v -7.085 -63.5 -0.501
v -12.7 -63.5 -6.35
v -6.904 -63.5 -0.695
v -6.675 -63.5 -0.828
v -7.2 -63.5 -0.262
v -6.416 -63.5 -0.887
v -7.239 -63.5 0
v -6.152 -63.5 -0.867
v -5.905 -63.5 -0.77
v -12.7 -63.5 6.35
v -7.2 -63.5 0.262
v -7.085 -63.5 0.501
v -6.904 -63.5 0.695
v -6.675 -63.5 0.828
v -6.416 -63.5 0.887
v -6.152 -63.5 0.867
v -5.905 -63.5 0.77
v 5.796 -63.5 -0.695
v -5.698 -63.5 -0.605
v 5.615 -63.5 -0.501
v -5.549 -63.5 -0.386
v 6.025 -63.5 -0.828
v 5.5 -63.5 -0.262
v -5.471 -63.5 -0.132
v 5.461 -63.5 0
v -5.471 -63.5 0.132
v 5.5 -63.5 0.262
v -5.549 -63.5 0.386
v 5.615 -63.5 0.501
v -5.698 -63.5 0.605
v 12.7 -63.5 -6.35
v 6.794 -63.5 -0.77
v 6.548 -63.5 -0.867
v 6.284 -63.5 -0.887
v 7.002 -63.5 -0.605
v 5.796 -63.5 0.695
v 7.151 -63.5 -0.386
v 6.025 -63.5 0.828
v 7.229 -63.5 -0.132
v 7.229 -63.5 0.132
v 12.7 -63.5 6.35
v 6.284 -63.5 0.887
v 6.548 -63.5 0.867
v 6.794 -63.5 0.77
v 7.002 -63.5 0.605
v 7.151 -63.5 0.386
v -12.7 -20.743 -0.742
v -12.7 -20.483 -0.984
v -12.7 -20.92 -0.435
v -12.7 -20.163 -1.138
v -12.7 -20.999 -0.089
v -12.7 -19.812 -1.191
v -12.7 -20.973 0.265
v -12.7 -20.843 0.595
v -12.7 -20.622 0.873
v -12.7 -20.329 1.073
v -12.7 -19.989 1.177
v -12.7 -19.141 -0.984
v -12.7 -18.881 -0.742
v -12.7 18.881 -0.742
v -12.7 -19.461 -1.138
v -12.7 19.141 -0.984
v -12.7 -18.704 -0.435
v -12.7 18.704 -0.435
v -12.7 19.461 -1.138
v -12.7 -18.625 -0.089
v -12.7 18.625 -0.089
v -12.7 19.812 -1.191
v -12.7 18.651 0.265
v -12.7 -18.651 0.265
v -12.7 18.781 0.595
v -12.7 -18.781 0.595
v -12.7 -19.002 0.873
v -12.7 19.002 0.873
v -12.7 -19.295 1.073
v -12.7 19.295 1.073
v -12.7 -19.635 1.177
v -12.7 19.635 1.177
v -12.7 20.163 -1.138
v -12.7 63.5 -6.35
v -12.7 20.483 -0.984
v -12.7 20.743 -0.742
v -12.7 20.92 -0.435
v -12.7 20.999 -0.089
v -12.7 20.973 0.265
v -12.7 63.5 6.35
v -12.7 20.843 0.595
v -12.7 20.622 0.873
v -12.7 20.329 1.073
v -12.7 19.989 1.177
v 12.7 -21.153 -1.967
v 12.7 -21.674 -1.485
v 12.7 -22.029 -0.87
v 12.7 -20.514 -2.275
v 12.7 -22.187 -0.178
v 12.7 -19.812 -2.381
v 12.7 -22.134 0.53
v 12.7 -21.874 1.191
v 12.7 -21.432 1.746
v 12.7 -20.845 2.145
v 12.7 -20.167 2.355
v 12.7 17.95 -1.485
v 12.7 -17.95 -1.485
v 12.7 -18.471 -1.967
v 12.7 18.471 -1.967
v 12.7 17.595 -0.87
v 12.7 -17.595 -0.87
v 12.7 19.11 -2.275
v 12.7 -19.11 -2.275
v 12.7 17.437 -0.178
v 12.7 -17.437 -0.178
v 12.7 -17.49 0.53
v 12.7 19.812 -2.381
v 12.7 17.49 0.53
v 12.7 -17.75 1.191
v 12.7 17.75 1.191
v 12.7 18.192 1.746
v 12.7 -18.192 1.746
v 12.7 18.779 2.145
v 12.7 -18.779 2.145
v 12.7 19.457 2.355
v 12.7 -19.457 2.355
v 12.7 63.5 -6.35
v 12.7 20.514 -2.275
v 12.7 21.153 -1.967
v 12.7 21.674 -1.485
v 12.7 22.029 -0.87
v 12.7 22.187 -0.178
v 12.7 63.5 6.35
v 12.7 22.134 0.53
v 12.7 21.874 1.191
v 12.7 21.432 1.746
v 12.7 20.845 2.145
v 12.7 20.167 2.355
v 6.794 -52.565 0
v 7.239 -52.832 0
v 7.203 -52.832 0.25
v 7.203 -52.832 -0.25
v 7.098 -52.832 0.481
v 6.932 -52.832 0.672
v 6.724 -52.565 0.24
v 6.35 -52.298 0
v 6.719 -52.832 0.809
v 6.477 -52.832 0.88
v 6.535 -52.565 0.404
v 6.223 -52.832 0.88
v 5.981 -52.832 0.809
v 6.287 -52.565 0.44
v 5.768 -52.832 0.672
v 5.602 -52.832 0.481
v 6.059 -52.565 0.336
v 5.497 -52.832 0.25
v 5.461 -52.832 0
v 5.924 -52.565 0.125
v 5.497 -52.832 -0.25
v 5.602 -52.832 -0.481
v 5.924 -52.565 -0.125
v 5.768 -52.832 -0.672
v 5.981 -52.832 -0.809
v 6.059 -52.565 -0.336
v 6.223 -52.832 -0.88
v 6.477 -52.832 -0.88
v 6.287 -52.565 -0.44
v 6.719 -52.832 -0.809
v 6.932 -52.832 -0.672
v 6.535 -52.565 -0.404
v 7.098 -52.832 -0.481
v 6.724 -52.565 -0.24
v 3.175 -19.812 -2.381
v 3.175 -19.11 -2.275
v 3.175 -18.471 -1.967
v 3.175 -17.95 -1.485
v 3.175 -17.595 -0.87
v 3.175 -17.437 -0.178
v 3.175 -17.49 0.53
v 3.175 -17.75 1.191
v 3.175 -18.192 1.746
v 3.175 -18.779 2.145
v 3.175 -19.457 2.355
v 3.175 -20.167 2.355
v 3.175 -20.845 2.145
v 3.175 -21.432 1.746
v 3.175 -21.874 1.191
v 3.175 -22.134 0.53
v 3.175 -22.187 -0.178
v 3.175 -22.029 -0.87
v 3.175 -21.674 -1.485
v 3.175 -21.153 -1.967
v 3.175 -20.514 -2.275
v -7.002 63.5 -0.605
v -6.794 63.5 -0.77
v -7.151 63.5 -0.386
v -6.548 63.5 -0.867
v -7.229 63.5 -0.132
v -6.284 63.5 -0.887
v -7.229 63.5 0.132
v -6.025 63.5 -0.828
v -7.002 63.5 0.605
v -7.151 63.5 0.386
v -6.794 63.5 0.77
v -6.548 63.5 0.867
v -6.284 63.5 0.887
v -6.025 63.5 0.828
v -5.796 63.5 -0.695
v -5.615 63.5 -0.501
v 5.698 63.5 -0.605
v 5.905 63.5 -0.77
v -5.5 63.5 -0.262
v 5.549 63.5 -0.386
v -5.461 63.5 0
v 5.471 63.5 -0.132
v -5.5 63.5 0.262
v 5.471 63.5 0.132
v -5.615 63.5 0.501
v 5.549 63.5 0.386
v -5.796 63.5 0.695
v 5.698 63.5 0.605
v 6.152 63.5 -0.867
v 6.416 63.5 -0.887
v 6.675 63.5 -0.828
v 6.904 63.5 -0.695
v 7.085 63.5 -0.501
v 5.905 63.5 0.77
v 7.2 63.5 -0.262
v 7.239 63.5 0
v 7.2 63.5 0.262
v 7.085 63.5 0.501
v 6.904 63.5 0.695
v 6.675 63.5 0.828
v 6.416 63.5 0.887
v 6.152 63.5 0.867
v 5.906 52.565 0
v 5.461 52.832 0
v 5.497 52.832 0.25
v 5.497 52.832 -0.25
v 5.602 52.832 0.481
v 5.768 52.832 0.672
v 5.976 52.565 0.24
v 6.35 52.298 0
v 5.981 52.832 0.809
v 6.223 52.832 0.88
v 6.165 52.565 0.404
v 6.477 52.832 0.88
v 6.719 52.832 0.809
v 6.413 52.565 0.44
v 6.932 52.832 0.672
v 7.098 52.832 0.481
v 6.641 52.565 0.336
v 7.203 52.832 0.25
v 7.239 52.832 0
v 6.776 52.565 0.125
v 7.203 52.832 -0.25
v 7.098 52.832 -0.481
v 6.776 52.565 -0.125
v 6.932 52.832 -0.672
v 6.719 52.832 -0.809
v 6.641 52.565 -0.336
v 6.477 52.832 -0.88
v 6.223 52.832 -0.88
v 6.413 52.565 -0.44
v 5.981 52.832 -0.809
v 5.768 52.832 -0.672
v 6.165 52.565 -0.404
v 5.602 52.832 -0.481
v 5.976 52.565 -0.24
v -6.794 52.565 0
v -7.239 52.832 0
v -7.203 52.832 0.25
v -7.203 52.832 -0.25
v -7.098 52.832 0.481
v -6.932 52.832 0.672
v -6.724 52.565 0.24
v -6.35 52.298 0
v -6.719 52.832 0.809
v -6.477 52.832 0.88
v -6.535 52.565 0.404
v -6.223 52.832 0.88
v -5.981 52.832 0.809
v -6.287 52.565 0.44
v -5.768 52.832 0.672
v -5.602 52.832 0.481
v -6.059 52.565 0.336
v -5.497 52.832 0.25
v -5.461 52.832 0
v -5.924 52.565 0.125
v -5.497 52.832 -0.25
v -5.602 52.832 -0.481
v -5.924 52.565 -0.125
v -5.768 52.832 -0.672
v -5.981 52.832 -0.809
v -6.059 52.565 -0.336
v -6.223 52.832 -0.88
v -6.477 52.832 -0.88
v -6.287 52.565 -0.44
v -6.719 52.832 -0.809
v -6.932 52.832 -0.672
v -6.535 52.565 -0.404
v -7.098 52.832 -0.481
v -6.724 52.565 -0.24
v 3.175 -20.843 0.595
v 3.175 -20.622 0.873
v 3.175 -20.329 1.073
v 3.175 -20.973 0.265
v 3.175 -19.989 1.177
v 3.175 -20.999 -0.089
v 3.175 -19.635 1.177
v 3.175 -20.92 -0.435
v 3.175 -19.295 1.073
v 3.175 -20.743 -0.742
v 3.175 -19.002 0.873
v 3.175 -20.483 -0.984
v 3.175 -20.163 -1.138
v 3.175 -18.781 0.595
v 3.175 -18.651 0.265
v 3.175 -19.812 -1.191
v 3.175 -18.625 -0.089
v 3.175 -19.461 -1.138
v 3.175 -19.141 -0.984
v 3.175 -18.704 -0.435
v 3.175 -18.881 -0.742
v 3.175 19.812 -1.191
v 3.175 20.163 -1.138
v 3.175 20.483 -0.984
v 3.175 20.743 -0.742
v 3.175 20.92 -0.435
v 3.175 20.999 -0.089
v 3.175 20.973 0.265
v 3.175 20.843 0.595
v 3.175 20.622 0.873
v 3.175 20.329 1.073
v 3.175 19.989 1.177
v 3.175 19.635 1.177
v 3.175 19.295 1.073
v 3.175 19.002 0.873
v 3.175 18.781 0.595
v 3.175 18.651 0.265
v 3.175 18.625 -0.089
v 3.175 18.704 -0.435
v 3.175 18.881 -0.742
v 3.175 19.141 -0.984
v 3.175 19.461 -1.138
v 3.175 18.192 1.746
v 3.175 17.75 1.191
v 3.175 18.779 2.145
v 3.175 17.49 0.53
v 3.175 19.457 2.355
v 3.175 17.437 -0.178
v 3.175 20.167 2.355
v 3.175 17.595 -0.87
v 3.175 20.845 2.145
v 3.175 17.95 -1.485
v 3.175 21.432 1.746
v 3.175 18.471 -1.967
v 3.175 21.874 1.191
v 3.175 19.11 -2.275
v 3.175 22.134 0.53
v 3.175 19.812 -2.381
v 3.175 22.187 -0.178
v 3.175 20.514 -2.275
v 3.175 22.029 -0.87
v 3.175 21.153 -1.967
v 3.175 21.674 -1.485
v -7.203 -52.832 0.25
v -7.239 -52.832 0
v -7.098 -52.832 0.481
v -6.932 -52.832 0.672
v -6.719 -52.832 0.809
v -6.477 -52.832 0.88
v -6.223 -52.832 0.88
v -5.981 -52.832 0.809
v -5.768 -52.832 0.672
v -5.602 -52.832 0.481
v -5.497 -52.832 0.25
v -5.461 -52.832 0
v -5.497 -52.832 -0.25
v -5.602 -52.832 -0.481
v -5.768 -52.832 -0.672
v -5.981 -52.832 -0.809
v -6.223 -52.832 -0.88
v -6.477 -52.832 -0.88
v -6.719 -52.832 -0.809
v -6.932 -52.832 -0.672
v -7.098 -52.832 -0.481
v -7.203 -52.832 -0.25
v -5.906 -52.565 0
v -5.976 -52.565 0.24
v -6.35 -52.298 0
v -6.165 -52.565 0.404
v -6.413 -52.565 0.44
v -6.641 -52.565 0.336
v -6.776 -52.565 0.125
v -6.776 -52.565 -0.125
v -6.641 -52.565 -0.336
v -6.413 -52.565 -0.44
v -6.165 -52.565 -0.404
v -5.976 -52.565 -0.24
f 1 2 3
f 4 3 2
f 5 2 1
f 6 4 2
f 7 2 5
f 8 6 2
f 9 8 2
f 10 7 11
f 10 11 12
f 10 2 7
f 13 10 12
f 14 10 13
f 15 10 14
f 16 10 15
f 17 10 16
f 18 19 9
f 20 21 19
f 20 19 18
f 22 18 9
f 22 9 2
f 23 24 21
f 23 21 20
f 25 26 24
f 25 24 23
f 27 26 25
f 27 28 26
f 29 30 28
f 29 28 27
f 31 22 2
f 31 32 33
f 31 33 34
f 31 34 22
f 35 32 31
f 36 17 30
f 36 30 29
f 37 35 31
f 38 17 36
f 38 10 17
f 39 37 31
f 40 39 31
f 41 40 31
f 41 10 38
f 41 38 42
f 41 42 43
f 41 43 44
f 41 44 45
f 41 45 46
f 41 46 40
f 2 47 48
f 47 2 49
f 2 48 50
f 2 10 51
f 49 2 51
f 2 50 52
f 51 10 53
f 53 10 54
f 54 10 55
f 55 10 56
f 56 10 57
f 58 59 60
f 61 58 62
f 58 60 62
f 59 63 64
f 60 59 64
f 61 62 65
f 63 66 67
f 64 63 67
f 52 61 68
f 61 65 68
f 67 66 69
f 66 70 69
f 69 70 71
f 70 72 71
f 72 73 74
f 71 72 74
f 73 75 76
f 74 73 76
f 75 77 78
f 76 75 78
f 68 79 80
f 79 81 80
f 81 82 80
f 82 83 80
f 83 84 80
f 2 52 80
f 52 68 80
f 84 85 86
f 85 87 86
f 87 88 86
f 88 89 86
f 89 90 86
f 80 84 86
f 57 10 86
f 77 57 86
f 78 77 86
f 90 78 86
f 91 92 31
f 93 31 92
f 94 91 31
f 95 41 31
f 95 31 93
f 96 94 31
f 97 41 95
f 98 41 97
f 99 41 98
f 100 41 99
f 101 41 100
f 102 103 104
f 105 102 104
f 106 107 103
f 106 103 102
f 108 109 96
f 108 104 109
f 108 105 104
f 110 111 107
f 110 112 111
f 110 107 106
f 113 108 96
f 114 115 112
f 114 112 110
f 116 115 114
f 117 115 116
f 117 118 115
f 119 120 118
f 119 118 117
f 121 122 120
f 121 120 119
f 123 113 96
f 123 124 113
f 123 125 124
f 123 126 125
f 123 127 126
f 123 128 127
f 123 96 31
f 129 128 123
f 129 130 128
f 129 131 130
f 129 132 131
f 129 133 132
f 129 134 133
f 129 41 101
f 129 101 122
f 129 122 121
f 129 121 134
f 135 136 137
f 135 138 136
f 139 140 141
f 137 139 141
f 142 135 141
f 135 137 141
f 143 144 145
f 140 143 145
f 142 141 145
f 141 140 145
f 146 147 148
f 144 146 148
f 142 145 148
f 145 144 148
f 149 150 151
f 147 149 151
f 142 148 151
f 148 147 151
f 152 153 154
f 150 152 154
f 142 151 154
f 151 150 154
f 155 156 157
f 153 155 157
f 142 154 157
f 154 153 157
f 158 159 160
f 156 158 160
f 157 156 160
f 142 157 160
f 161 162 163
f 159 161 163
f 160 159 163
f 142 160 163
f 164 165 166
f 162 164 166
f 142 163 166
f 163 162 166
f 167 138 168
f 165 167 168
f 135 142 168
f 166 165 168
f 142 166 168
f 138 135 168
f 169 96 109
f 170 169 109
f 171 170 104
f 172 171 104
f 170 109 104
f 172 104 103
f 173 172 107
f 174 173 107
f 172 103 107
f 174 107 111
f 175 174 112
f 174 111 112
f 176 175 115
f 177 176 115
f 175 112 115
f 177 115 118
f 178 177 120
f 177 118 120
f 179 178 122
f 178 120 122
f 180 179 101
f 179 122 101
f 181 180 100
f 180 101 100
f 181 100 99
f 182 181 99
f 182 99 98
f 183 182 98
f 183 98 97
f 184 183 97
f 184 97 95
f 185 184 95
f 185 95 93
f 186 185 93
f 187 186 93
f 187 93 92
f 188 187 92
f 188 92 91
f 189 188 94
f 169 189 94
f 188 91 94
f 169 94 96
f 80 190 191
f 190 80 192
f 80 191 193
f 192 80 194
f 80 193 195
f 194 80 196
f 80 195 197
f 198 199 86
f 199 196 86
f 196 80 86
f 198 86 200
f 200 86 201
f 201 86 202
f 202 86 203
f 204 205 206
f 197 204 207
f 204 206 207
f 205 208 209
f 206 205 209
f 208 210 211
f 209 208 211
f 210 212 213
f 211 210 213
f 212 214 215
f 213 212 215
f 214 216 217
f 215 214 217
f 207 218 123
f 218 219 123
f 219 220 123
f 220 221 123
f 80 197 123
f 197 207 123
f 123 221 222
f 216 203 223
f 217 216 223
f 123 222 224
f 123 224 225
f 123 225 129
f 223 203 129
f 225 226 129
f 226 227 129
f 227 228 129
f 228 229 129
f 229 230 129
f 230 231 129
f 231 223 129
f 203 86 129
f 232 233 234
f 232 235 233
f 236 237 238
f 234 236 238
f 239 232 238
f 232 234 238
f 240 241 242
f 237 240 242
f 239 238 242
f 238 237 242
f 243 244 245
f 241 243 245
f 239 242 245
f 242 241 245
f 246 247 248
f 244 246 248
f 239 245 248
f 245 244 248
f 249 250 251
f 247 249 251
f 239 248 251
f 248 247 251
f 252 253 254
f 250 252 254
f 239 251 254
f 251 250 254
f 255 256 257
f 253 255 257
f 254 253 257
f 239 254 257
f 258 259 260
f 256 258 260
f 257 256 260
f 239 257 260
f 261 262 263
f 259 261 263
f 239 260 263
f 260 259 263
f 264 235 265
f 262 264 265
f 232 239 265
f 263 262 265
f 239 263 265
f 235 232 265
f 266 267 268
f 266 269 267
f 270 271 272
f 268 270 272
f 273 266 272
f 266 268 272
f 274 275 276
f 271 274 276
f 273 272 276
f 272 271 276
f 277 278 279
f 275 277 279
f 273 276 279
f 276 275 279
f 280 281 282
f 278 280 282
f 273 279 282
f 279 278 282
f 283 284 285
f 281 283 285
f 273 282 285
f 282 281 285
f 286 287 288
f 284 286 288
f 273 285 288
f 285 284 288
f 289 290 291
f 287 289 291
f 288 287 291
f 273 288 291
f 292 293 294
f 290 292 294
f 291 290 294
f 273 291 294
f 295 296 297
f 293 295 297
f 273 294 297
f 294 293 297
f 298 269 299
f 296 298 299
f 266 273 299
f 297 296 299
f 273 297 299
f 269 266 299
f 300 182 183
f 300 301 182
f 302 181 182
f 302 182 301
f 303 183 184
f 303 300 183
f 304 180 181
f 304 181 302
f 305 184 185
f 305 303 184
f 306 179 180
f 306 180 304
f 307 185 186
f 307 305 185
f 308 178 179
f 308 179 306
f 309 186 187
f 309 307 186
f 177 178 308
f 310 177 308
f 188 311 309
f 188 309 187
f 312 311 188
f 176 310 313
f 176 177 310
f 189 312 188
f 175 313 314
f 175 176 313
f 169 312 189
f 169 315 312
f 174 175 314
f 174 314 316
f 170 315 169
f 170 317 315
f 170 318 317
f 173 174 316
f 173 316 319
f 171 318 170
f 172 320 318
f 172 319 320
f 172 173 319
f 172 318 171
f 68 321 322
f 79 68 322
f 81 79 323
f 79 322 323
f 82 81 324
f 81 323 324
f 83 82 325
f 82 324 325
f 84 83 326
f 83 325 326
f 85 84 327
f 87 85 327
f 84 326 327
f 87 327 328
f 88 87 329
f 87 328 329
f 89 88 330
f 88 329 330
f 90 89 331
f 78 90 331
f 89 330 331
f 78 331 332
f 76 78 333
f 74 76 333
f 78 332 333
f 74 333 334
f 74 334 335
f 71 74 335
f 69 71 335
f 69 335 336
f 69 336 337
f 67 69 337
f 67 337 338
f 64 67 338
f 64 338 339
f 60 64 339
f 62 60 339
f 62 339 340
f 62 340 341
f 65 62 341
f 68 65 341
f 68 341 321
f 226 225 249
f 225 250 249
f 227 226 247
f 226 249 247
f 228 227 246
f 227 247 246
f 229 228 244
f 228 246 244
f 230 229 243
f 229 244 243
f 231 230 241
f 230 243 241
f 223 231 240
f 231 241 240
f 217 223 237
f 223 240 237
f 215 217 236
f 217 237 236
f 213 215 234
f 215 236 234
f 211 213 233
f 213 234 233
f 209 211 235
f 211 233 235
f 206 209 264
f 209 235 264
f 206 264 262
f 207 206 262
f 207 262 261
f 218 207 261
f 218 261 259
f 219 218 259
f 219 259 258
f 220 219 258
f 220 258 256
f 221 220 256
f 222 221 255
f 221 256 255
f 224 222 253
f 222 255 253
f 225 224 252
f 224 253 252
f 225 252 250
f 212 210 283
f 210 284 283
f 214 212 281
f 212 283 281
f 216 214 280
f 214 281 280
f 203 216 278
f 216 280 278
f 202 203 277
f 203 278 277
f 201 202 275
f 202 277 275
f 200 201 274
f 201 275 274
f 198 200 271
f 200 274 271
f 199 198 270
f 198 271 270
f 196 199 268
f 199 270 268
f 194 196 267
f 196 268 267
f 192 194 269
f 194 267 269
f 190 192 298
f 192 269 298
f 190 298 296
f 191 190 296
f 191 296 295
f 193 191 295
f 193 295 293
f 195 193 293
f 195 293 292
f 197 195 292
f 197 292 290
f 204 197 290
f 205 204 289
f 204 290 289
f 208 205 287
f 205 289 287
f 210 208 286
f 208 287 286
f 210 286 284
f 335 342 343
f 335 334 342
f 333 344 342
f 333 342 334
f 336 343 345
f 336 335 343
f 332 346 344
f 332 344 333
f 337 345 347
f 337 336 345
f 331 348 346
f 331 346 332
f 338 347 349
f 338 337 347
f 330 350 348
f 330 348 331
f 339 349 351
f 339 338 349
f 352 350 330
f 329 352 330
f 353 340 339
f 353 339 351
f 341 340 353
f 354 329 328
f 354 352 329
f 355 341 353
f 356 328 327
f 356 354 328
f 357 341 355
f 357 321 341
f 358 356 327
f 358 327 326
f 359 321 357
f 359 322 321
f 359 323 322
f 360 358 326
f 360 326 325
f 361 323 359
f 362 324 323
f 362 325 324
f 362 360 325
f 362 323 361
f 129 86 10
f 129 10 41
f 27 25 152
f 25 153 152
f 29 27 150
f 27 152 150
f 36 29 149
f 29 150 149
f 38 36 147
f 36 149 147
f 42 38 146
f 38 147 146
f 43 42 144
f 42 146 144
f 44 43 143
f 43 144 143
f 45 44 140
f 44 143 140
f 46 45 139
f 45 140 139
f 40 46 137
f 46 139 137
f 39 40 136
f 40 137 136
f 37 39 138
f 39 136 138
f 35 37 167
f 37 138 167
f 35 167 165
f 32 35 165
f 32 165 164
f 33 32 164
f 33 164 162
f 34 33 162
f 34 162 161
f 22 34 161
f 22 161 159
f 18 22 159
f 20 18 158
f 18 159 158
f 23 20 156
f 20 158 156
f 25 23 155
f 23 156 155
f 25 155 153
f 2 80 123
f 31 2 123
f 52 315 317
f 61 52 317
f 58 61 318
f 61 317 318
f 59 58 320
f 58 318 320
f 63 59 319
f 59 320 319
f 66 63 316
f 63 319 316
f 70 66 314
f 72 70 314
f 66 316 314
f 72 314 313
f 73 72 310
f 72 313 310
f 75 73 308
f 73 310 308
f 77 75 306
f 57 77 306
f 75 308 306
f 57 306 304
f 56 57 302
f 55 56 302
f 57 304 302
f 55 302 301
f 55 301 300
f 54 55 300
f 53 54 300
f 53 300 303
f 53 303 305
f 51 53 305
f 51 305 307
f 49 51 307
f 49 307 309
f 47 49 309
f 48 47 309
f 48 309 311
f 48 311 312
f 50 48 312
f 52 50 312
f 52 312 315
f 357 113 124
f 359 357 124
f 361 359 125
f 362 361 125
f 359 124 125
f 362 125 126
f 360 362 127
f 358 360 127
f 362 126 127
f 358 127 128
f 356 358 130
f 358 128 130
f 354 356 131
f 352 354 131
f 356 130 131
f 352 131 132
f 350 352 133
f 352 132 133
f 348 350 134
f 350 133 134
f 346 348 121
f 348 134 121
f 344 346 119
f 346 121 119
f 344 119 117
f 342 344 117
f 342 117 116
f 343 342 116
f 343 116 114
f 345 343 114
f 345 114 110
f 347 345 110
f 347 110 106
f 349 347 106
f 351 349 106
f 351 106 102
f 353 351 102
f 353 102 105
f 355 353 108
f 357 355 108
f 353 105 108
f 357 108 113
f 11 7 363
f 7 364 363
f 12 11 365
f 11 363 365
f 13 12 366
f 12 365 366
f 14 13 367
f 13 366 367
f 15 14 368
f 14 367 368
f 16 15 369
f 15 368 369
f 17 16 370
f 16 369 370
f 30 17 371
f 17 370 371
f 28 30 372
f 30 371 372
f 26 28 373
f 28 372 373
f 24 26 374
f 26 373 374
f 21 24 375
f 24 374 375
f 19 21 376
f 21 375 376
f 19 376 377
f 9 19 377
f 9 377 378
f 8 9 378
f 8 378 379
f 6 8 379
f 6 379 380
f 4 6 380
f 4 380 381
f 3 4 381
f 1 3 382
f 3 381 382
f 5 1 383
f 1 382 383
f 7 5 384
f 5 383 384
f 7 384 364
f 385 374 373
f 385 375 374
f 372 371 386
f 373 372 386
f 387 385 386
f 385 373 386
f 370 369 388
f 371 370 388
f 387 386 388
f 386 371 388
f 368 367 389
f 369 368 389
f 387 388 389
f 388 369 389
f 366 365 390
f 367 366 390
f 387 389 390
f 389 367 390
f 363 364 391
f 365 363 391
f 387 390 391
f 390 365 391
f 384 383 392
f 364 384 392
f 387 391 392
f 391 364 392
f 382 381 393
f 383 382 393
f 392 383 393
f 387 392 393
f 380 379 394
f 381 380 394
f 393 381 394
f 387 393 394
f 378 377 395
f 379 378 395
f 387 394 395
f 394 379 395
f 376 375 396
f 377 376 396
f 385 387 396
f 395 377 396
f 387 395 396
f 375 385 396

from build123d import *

# Parameters (mm, degrees)
SKETCH2_W                 = 25.4
SKETCH2_H                 = 127
BOSS_EXTRUDE1_DEPTH       = 6.35
SKETCH3_R                 = 1.190625
CUT_EXTRUDE2_DEPTH        = 26.4
SKETCH3_4_R               = 2.38125
SKETCH3_4_R_2             = 1.190625
CUT_EXTRUDE3_DEPTH        = 9.525
F_2_56_TAPPED_HOLE1_D     = 1.778
F_2_56_TAPPED_HOLE1_DEPTH = 10.668
F_2_56_TAPPED_HOLE1_TIP   = 0.53416509
F_2_56_TAPPED_HOLE2_D     = 1.778
F_2_56_TAPPED_HOLE2_DEPTH = 10.668
F_2_56_TAPPED_HOLE2_TIP   = 0.53416509


with BuildPart() as part:
    # Sketch2 → Boss-Extrude1 (new body, symmetric)
    with BuildSketch(Plane.XY):
        Rectangle(SKETCH2_W, SKETCH2_H)
    extrude(amount=BOSS_EXTRUDE1_DEPTH, both=True)

    # Sketch3 → Cut-Extrude2 (cut, through all)
    with BuildSketch(Plane(origin=(12.7, 0, 0), x_dir=(0, 0, -1), z_dir=(1, 0, 0))):
        with Locations((0, 19.812)):
            Circle(SKETCH3_R)
        with Locations((0, -19.812)):
            Circle(SKETCH3_R)
    extrude(amount=-CUT_EXTRUDE2_DEPTH, mode=Mode.SUBTRACT)

    # Sketch3_4 → Cut-Extrude3 (cut)
    with BuildSketch(Plane(origin=(12.7, 0, 0), x_dir=(0, 0, -1), z_dir=(1, 0, 0))):
        with Locations((0, 19.812)):
            Circle(SKETCH3_4_R)
        with Locations((0, 19.812)):
            Circle(SKETCH3_4_R_2, mode=Mode.SUBTRACT)
        with Locations((0, -19.812)):
            Circle(SKETCH3_4_R)
        with Locations((0, -19.812)):
            Circle(SKETCH3_4_R_2, mode=Mode.SUBTRACT)
    extrude(amount=-CUT_EXTRUDE3_DEPTH, mode=Mode.SUBTRACT)

    # 2-56 Tapped Hole1
    with Locations(Plane(origin=(0, 63.5, 0), x_dir=(-1, 0, 0), z_dir=(0, 1, 0))):
        with Locations((6.35, 0), (-6.35, 0)):
            Hole(F_2_56_TAPPED_HOLE1_D / 2, depth=F_2_56_TAPPED_HOLE1_DEPTH)
            with Locations((0, 0, -(F_2_56_TAPPED_HOLE1_DEPTH + F_2_56_TAPPED_HOLE1_TIP / 2))):  # 118° drill point
                Cone(0, F_2_56_TAPPED_HOLE1_D / 2, F_2_56_TAPPED_HOLE1_TIP, mode=Mode.SUBTRACT)

    # 2-56 Tapped Hole2
    with Locations(Plane.XZ.offset(63.5)):
        with Locations((6.35, 0), (-6.35, 0)):
            Hole(F_2_56_TAPPED_HOLE2_D / 2, depth=F_2_56_TAPPED_HOLE2_DEPTH)
            with Locations((0, 0, -(F_2_56_TAPPED_HOLE2_DEPTH + F_2_56_TAPPED_HOLE2_TIP / 2))):  # 118° drill point
                Cone(0, F_2_56_TAPPED_HOLE2_D / 2, F_2_56_TAPPED_HOLE2_TIP, mode=Mode.SUBTRACT)


solid = part.part
